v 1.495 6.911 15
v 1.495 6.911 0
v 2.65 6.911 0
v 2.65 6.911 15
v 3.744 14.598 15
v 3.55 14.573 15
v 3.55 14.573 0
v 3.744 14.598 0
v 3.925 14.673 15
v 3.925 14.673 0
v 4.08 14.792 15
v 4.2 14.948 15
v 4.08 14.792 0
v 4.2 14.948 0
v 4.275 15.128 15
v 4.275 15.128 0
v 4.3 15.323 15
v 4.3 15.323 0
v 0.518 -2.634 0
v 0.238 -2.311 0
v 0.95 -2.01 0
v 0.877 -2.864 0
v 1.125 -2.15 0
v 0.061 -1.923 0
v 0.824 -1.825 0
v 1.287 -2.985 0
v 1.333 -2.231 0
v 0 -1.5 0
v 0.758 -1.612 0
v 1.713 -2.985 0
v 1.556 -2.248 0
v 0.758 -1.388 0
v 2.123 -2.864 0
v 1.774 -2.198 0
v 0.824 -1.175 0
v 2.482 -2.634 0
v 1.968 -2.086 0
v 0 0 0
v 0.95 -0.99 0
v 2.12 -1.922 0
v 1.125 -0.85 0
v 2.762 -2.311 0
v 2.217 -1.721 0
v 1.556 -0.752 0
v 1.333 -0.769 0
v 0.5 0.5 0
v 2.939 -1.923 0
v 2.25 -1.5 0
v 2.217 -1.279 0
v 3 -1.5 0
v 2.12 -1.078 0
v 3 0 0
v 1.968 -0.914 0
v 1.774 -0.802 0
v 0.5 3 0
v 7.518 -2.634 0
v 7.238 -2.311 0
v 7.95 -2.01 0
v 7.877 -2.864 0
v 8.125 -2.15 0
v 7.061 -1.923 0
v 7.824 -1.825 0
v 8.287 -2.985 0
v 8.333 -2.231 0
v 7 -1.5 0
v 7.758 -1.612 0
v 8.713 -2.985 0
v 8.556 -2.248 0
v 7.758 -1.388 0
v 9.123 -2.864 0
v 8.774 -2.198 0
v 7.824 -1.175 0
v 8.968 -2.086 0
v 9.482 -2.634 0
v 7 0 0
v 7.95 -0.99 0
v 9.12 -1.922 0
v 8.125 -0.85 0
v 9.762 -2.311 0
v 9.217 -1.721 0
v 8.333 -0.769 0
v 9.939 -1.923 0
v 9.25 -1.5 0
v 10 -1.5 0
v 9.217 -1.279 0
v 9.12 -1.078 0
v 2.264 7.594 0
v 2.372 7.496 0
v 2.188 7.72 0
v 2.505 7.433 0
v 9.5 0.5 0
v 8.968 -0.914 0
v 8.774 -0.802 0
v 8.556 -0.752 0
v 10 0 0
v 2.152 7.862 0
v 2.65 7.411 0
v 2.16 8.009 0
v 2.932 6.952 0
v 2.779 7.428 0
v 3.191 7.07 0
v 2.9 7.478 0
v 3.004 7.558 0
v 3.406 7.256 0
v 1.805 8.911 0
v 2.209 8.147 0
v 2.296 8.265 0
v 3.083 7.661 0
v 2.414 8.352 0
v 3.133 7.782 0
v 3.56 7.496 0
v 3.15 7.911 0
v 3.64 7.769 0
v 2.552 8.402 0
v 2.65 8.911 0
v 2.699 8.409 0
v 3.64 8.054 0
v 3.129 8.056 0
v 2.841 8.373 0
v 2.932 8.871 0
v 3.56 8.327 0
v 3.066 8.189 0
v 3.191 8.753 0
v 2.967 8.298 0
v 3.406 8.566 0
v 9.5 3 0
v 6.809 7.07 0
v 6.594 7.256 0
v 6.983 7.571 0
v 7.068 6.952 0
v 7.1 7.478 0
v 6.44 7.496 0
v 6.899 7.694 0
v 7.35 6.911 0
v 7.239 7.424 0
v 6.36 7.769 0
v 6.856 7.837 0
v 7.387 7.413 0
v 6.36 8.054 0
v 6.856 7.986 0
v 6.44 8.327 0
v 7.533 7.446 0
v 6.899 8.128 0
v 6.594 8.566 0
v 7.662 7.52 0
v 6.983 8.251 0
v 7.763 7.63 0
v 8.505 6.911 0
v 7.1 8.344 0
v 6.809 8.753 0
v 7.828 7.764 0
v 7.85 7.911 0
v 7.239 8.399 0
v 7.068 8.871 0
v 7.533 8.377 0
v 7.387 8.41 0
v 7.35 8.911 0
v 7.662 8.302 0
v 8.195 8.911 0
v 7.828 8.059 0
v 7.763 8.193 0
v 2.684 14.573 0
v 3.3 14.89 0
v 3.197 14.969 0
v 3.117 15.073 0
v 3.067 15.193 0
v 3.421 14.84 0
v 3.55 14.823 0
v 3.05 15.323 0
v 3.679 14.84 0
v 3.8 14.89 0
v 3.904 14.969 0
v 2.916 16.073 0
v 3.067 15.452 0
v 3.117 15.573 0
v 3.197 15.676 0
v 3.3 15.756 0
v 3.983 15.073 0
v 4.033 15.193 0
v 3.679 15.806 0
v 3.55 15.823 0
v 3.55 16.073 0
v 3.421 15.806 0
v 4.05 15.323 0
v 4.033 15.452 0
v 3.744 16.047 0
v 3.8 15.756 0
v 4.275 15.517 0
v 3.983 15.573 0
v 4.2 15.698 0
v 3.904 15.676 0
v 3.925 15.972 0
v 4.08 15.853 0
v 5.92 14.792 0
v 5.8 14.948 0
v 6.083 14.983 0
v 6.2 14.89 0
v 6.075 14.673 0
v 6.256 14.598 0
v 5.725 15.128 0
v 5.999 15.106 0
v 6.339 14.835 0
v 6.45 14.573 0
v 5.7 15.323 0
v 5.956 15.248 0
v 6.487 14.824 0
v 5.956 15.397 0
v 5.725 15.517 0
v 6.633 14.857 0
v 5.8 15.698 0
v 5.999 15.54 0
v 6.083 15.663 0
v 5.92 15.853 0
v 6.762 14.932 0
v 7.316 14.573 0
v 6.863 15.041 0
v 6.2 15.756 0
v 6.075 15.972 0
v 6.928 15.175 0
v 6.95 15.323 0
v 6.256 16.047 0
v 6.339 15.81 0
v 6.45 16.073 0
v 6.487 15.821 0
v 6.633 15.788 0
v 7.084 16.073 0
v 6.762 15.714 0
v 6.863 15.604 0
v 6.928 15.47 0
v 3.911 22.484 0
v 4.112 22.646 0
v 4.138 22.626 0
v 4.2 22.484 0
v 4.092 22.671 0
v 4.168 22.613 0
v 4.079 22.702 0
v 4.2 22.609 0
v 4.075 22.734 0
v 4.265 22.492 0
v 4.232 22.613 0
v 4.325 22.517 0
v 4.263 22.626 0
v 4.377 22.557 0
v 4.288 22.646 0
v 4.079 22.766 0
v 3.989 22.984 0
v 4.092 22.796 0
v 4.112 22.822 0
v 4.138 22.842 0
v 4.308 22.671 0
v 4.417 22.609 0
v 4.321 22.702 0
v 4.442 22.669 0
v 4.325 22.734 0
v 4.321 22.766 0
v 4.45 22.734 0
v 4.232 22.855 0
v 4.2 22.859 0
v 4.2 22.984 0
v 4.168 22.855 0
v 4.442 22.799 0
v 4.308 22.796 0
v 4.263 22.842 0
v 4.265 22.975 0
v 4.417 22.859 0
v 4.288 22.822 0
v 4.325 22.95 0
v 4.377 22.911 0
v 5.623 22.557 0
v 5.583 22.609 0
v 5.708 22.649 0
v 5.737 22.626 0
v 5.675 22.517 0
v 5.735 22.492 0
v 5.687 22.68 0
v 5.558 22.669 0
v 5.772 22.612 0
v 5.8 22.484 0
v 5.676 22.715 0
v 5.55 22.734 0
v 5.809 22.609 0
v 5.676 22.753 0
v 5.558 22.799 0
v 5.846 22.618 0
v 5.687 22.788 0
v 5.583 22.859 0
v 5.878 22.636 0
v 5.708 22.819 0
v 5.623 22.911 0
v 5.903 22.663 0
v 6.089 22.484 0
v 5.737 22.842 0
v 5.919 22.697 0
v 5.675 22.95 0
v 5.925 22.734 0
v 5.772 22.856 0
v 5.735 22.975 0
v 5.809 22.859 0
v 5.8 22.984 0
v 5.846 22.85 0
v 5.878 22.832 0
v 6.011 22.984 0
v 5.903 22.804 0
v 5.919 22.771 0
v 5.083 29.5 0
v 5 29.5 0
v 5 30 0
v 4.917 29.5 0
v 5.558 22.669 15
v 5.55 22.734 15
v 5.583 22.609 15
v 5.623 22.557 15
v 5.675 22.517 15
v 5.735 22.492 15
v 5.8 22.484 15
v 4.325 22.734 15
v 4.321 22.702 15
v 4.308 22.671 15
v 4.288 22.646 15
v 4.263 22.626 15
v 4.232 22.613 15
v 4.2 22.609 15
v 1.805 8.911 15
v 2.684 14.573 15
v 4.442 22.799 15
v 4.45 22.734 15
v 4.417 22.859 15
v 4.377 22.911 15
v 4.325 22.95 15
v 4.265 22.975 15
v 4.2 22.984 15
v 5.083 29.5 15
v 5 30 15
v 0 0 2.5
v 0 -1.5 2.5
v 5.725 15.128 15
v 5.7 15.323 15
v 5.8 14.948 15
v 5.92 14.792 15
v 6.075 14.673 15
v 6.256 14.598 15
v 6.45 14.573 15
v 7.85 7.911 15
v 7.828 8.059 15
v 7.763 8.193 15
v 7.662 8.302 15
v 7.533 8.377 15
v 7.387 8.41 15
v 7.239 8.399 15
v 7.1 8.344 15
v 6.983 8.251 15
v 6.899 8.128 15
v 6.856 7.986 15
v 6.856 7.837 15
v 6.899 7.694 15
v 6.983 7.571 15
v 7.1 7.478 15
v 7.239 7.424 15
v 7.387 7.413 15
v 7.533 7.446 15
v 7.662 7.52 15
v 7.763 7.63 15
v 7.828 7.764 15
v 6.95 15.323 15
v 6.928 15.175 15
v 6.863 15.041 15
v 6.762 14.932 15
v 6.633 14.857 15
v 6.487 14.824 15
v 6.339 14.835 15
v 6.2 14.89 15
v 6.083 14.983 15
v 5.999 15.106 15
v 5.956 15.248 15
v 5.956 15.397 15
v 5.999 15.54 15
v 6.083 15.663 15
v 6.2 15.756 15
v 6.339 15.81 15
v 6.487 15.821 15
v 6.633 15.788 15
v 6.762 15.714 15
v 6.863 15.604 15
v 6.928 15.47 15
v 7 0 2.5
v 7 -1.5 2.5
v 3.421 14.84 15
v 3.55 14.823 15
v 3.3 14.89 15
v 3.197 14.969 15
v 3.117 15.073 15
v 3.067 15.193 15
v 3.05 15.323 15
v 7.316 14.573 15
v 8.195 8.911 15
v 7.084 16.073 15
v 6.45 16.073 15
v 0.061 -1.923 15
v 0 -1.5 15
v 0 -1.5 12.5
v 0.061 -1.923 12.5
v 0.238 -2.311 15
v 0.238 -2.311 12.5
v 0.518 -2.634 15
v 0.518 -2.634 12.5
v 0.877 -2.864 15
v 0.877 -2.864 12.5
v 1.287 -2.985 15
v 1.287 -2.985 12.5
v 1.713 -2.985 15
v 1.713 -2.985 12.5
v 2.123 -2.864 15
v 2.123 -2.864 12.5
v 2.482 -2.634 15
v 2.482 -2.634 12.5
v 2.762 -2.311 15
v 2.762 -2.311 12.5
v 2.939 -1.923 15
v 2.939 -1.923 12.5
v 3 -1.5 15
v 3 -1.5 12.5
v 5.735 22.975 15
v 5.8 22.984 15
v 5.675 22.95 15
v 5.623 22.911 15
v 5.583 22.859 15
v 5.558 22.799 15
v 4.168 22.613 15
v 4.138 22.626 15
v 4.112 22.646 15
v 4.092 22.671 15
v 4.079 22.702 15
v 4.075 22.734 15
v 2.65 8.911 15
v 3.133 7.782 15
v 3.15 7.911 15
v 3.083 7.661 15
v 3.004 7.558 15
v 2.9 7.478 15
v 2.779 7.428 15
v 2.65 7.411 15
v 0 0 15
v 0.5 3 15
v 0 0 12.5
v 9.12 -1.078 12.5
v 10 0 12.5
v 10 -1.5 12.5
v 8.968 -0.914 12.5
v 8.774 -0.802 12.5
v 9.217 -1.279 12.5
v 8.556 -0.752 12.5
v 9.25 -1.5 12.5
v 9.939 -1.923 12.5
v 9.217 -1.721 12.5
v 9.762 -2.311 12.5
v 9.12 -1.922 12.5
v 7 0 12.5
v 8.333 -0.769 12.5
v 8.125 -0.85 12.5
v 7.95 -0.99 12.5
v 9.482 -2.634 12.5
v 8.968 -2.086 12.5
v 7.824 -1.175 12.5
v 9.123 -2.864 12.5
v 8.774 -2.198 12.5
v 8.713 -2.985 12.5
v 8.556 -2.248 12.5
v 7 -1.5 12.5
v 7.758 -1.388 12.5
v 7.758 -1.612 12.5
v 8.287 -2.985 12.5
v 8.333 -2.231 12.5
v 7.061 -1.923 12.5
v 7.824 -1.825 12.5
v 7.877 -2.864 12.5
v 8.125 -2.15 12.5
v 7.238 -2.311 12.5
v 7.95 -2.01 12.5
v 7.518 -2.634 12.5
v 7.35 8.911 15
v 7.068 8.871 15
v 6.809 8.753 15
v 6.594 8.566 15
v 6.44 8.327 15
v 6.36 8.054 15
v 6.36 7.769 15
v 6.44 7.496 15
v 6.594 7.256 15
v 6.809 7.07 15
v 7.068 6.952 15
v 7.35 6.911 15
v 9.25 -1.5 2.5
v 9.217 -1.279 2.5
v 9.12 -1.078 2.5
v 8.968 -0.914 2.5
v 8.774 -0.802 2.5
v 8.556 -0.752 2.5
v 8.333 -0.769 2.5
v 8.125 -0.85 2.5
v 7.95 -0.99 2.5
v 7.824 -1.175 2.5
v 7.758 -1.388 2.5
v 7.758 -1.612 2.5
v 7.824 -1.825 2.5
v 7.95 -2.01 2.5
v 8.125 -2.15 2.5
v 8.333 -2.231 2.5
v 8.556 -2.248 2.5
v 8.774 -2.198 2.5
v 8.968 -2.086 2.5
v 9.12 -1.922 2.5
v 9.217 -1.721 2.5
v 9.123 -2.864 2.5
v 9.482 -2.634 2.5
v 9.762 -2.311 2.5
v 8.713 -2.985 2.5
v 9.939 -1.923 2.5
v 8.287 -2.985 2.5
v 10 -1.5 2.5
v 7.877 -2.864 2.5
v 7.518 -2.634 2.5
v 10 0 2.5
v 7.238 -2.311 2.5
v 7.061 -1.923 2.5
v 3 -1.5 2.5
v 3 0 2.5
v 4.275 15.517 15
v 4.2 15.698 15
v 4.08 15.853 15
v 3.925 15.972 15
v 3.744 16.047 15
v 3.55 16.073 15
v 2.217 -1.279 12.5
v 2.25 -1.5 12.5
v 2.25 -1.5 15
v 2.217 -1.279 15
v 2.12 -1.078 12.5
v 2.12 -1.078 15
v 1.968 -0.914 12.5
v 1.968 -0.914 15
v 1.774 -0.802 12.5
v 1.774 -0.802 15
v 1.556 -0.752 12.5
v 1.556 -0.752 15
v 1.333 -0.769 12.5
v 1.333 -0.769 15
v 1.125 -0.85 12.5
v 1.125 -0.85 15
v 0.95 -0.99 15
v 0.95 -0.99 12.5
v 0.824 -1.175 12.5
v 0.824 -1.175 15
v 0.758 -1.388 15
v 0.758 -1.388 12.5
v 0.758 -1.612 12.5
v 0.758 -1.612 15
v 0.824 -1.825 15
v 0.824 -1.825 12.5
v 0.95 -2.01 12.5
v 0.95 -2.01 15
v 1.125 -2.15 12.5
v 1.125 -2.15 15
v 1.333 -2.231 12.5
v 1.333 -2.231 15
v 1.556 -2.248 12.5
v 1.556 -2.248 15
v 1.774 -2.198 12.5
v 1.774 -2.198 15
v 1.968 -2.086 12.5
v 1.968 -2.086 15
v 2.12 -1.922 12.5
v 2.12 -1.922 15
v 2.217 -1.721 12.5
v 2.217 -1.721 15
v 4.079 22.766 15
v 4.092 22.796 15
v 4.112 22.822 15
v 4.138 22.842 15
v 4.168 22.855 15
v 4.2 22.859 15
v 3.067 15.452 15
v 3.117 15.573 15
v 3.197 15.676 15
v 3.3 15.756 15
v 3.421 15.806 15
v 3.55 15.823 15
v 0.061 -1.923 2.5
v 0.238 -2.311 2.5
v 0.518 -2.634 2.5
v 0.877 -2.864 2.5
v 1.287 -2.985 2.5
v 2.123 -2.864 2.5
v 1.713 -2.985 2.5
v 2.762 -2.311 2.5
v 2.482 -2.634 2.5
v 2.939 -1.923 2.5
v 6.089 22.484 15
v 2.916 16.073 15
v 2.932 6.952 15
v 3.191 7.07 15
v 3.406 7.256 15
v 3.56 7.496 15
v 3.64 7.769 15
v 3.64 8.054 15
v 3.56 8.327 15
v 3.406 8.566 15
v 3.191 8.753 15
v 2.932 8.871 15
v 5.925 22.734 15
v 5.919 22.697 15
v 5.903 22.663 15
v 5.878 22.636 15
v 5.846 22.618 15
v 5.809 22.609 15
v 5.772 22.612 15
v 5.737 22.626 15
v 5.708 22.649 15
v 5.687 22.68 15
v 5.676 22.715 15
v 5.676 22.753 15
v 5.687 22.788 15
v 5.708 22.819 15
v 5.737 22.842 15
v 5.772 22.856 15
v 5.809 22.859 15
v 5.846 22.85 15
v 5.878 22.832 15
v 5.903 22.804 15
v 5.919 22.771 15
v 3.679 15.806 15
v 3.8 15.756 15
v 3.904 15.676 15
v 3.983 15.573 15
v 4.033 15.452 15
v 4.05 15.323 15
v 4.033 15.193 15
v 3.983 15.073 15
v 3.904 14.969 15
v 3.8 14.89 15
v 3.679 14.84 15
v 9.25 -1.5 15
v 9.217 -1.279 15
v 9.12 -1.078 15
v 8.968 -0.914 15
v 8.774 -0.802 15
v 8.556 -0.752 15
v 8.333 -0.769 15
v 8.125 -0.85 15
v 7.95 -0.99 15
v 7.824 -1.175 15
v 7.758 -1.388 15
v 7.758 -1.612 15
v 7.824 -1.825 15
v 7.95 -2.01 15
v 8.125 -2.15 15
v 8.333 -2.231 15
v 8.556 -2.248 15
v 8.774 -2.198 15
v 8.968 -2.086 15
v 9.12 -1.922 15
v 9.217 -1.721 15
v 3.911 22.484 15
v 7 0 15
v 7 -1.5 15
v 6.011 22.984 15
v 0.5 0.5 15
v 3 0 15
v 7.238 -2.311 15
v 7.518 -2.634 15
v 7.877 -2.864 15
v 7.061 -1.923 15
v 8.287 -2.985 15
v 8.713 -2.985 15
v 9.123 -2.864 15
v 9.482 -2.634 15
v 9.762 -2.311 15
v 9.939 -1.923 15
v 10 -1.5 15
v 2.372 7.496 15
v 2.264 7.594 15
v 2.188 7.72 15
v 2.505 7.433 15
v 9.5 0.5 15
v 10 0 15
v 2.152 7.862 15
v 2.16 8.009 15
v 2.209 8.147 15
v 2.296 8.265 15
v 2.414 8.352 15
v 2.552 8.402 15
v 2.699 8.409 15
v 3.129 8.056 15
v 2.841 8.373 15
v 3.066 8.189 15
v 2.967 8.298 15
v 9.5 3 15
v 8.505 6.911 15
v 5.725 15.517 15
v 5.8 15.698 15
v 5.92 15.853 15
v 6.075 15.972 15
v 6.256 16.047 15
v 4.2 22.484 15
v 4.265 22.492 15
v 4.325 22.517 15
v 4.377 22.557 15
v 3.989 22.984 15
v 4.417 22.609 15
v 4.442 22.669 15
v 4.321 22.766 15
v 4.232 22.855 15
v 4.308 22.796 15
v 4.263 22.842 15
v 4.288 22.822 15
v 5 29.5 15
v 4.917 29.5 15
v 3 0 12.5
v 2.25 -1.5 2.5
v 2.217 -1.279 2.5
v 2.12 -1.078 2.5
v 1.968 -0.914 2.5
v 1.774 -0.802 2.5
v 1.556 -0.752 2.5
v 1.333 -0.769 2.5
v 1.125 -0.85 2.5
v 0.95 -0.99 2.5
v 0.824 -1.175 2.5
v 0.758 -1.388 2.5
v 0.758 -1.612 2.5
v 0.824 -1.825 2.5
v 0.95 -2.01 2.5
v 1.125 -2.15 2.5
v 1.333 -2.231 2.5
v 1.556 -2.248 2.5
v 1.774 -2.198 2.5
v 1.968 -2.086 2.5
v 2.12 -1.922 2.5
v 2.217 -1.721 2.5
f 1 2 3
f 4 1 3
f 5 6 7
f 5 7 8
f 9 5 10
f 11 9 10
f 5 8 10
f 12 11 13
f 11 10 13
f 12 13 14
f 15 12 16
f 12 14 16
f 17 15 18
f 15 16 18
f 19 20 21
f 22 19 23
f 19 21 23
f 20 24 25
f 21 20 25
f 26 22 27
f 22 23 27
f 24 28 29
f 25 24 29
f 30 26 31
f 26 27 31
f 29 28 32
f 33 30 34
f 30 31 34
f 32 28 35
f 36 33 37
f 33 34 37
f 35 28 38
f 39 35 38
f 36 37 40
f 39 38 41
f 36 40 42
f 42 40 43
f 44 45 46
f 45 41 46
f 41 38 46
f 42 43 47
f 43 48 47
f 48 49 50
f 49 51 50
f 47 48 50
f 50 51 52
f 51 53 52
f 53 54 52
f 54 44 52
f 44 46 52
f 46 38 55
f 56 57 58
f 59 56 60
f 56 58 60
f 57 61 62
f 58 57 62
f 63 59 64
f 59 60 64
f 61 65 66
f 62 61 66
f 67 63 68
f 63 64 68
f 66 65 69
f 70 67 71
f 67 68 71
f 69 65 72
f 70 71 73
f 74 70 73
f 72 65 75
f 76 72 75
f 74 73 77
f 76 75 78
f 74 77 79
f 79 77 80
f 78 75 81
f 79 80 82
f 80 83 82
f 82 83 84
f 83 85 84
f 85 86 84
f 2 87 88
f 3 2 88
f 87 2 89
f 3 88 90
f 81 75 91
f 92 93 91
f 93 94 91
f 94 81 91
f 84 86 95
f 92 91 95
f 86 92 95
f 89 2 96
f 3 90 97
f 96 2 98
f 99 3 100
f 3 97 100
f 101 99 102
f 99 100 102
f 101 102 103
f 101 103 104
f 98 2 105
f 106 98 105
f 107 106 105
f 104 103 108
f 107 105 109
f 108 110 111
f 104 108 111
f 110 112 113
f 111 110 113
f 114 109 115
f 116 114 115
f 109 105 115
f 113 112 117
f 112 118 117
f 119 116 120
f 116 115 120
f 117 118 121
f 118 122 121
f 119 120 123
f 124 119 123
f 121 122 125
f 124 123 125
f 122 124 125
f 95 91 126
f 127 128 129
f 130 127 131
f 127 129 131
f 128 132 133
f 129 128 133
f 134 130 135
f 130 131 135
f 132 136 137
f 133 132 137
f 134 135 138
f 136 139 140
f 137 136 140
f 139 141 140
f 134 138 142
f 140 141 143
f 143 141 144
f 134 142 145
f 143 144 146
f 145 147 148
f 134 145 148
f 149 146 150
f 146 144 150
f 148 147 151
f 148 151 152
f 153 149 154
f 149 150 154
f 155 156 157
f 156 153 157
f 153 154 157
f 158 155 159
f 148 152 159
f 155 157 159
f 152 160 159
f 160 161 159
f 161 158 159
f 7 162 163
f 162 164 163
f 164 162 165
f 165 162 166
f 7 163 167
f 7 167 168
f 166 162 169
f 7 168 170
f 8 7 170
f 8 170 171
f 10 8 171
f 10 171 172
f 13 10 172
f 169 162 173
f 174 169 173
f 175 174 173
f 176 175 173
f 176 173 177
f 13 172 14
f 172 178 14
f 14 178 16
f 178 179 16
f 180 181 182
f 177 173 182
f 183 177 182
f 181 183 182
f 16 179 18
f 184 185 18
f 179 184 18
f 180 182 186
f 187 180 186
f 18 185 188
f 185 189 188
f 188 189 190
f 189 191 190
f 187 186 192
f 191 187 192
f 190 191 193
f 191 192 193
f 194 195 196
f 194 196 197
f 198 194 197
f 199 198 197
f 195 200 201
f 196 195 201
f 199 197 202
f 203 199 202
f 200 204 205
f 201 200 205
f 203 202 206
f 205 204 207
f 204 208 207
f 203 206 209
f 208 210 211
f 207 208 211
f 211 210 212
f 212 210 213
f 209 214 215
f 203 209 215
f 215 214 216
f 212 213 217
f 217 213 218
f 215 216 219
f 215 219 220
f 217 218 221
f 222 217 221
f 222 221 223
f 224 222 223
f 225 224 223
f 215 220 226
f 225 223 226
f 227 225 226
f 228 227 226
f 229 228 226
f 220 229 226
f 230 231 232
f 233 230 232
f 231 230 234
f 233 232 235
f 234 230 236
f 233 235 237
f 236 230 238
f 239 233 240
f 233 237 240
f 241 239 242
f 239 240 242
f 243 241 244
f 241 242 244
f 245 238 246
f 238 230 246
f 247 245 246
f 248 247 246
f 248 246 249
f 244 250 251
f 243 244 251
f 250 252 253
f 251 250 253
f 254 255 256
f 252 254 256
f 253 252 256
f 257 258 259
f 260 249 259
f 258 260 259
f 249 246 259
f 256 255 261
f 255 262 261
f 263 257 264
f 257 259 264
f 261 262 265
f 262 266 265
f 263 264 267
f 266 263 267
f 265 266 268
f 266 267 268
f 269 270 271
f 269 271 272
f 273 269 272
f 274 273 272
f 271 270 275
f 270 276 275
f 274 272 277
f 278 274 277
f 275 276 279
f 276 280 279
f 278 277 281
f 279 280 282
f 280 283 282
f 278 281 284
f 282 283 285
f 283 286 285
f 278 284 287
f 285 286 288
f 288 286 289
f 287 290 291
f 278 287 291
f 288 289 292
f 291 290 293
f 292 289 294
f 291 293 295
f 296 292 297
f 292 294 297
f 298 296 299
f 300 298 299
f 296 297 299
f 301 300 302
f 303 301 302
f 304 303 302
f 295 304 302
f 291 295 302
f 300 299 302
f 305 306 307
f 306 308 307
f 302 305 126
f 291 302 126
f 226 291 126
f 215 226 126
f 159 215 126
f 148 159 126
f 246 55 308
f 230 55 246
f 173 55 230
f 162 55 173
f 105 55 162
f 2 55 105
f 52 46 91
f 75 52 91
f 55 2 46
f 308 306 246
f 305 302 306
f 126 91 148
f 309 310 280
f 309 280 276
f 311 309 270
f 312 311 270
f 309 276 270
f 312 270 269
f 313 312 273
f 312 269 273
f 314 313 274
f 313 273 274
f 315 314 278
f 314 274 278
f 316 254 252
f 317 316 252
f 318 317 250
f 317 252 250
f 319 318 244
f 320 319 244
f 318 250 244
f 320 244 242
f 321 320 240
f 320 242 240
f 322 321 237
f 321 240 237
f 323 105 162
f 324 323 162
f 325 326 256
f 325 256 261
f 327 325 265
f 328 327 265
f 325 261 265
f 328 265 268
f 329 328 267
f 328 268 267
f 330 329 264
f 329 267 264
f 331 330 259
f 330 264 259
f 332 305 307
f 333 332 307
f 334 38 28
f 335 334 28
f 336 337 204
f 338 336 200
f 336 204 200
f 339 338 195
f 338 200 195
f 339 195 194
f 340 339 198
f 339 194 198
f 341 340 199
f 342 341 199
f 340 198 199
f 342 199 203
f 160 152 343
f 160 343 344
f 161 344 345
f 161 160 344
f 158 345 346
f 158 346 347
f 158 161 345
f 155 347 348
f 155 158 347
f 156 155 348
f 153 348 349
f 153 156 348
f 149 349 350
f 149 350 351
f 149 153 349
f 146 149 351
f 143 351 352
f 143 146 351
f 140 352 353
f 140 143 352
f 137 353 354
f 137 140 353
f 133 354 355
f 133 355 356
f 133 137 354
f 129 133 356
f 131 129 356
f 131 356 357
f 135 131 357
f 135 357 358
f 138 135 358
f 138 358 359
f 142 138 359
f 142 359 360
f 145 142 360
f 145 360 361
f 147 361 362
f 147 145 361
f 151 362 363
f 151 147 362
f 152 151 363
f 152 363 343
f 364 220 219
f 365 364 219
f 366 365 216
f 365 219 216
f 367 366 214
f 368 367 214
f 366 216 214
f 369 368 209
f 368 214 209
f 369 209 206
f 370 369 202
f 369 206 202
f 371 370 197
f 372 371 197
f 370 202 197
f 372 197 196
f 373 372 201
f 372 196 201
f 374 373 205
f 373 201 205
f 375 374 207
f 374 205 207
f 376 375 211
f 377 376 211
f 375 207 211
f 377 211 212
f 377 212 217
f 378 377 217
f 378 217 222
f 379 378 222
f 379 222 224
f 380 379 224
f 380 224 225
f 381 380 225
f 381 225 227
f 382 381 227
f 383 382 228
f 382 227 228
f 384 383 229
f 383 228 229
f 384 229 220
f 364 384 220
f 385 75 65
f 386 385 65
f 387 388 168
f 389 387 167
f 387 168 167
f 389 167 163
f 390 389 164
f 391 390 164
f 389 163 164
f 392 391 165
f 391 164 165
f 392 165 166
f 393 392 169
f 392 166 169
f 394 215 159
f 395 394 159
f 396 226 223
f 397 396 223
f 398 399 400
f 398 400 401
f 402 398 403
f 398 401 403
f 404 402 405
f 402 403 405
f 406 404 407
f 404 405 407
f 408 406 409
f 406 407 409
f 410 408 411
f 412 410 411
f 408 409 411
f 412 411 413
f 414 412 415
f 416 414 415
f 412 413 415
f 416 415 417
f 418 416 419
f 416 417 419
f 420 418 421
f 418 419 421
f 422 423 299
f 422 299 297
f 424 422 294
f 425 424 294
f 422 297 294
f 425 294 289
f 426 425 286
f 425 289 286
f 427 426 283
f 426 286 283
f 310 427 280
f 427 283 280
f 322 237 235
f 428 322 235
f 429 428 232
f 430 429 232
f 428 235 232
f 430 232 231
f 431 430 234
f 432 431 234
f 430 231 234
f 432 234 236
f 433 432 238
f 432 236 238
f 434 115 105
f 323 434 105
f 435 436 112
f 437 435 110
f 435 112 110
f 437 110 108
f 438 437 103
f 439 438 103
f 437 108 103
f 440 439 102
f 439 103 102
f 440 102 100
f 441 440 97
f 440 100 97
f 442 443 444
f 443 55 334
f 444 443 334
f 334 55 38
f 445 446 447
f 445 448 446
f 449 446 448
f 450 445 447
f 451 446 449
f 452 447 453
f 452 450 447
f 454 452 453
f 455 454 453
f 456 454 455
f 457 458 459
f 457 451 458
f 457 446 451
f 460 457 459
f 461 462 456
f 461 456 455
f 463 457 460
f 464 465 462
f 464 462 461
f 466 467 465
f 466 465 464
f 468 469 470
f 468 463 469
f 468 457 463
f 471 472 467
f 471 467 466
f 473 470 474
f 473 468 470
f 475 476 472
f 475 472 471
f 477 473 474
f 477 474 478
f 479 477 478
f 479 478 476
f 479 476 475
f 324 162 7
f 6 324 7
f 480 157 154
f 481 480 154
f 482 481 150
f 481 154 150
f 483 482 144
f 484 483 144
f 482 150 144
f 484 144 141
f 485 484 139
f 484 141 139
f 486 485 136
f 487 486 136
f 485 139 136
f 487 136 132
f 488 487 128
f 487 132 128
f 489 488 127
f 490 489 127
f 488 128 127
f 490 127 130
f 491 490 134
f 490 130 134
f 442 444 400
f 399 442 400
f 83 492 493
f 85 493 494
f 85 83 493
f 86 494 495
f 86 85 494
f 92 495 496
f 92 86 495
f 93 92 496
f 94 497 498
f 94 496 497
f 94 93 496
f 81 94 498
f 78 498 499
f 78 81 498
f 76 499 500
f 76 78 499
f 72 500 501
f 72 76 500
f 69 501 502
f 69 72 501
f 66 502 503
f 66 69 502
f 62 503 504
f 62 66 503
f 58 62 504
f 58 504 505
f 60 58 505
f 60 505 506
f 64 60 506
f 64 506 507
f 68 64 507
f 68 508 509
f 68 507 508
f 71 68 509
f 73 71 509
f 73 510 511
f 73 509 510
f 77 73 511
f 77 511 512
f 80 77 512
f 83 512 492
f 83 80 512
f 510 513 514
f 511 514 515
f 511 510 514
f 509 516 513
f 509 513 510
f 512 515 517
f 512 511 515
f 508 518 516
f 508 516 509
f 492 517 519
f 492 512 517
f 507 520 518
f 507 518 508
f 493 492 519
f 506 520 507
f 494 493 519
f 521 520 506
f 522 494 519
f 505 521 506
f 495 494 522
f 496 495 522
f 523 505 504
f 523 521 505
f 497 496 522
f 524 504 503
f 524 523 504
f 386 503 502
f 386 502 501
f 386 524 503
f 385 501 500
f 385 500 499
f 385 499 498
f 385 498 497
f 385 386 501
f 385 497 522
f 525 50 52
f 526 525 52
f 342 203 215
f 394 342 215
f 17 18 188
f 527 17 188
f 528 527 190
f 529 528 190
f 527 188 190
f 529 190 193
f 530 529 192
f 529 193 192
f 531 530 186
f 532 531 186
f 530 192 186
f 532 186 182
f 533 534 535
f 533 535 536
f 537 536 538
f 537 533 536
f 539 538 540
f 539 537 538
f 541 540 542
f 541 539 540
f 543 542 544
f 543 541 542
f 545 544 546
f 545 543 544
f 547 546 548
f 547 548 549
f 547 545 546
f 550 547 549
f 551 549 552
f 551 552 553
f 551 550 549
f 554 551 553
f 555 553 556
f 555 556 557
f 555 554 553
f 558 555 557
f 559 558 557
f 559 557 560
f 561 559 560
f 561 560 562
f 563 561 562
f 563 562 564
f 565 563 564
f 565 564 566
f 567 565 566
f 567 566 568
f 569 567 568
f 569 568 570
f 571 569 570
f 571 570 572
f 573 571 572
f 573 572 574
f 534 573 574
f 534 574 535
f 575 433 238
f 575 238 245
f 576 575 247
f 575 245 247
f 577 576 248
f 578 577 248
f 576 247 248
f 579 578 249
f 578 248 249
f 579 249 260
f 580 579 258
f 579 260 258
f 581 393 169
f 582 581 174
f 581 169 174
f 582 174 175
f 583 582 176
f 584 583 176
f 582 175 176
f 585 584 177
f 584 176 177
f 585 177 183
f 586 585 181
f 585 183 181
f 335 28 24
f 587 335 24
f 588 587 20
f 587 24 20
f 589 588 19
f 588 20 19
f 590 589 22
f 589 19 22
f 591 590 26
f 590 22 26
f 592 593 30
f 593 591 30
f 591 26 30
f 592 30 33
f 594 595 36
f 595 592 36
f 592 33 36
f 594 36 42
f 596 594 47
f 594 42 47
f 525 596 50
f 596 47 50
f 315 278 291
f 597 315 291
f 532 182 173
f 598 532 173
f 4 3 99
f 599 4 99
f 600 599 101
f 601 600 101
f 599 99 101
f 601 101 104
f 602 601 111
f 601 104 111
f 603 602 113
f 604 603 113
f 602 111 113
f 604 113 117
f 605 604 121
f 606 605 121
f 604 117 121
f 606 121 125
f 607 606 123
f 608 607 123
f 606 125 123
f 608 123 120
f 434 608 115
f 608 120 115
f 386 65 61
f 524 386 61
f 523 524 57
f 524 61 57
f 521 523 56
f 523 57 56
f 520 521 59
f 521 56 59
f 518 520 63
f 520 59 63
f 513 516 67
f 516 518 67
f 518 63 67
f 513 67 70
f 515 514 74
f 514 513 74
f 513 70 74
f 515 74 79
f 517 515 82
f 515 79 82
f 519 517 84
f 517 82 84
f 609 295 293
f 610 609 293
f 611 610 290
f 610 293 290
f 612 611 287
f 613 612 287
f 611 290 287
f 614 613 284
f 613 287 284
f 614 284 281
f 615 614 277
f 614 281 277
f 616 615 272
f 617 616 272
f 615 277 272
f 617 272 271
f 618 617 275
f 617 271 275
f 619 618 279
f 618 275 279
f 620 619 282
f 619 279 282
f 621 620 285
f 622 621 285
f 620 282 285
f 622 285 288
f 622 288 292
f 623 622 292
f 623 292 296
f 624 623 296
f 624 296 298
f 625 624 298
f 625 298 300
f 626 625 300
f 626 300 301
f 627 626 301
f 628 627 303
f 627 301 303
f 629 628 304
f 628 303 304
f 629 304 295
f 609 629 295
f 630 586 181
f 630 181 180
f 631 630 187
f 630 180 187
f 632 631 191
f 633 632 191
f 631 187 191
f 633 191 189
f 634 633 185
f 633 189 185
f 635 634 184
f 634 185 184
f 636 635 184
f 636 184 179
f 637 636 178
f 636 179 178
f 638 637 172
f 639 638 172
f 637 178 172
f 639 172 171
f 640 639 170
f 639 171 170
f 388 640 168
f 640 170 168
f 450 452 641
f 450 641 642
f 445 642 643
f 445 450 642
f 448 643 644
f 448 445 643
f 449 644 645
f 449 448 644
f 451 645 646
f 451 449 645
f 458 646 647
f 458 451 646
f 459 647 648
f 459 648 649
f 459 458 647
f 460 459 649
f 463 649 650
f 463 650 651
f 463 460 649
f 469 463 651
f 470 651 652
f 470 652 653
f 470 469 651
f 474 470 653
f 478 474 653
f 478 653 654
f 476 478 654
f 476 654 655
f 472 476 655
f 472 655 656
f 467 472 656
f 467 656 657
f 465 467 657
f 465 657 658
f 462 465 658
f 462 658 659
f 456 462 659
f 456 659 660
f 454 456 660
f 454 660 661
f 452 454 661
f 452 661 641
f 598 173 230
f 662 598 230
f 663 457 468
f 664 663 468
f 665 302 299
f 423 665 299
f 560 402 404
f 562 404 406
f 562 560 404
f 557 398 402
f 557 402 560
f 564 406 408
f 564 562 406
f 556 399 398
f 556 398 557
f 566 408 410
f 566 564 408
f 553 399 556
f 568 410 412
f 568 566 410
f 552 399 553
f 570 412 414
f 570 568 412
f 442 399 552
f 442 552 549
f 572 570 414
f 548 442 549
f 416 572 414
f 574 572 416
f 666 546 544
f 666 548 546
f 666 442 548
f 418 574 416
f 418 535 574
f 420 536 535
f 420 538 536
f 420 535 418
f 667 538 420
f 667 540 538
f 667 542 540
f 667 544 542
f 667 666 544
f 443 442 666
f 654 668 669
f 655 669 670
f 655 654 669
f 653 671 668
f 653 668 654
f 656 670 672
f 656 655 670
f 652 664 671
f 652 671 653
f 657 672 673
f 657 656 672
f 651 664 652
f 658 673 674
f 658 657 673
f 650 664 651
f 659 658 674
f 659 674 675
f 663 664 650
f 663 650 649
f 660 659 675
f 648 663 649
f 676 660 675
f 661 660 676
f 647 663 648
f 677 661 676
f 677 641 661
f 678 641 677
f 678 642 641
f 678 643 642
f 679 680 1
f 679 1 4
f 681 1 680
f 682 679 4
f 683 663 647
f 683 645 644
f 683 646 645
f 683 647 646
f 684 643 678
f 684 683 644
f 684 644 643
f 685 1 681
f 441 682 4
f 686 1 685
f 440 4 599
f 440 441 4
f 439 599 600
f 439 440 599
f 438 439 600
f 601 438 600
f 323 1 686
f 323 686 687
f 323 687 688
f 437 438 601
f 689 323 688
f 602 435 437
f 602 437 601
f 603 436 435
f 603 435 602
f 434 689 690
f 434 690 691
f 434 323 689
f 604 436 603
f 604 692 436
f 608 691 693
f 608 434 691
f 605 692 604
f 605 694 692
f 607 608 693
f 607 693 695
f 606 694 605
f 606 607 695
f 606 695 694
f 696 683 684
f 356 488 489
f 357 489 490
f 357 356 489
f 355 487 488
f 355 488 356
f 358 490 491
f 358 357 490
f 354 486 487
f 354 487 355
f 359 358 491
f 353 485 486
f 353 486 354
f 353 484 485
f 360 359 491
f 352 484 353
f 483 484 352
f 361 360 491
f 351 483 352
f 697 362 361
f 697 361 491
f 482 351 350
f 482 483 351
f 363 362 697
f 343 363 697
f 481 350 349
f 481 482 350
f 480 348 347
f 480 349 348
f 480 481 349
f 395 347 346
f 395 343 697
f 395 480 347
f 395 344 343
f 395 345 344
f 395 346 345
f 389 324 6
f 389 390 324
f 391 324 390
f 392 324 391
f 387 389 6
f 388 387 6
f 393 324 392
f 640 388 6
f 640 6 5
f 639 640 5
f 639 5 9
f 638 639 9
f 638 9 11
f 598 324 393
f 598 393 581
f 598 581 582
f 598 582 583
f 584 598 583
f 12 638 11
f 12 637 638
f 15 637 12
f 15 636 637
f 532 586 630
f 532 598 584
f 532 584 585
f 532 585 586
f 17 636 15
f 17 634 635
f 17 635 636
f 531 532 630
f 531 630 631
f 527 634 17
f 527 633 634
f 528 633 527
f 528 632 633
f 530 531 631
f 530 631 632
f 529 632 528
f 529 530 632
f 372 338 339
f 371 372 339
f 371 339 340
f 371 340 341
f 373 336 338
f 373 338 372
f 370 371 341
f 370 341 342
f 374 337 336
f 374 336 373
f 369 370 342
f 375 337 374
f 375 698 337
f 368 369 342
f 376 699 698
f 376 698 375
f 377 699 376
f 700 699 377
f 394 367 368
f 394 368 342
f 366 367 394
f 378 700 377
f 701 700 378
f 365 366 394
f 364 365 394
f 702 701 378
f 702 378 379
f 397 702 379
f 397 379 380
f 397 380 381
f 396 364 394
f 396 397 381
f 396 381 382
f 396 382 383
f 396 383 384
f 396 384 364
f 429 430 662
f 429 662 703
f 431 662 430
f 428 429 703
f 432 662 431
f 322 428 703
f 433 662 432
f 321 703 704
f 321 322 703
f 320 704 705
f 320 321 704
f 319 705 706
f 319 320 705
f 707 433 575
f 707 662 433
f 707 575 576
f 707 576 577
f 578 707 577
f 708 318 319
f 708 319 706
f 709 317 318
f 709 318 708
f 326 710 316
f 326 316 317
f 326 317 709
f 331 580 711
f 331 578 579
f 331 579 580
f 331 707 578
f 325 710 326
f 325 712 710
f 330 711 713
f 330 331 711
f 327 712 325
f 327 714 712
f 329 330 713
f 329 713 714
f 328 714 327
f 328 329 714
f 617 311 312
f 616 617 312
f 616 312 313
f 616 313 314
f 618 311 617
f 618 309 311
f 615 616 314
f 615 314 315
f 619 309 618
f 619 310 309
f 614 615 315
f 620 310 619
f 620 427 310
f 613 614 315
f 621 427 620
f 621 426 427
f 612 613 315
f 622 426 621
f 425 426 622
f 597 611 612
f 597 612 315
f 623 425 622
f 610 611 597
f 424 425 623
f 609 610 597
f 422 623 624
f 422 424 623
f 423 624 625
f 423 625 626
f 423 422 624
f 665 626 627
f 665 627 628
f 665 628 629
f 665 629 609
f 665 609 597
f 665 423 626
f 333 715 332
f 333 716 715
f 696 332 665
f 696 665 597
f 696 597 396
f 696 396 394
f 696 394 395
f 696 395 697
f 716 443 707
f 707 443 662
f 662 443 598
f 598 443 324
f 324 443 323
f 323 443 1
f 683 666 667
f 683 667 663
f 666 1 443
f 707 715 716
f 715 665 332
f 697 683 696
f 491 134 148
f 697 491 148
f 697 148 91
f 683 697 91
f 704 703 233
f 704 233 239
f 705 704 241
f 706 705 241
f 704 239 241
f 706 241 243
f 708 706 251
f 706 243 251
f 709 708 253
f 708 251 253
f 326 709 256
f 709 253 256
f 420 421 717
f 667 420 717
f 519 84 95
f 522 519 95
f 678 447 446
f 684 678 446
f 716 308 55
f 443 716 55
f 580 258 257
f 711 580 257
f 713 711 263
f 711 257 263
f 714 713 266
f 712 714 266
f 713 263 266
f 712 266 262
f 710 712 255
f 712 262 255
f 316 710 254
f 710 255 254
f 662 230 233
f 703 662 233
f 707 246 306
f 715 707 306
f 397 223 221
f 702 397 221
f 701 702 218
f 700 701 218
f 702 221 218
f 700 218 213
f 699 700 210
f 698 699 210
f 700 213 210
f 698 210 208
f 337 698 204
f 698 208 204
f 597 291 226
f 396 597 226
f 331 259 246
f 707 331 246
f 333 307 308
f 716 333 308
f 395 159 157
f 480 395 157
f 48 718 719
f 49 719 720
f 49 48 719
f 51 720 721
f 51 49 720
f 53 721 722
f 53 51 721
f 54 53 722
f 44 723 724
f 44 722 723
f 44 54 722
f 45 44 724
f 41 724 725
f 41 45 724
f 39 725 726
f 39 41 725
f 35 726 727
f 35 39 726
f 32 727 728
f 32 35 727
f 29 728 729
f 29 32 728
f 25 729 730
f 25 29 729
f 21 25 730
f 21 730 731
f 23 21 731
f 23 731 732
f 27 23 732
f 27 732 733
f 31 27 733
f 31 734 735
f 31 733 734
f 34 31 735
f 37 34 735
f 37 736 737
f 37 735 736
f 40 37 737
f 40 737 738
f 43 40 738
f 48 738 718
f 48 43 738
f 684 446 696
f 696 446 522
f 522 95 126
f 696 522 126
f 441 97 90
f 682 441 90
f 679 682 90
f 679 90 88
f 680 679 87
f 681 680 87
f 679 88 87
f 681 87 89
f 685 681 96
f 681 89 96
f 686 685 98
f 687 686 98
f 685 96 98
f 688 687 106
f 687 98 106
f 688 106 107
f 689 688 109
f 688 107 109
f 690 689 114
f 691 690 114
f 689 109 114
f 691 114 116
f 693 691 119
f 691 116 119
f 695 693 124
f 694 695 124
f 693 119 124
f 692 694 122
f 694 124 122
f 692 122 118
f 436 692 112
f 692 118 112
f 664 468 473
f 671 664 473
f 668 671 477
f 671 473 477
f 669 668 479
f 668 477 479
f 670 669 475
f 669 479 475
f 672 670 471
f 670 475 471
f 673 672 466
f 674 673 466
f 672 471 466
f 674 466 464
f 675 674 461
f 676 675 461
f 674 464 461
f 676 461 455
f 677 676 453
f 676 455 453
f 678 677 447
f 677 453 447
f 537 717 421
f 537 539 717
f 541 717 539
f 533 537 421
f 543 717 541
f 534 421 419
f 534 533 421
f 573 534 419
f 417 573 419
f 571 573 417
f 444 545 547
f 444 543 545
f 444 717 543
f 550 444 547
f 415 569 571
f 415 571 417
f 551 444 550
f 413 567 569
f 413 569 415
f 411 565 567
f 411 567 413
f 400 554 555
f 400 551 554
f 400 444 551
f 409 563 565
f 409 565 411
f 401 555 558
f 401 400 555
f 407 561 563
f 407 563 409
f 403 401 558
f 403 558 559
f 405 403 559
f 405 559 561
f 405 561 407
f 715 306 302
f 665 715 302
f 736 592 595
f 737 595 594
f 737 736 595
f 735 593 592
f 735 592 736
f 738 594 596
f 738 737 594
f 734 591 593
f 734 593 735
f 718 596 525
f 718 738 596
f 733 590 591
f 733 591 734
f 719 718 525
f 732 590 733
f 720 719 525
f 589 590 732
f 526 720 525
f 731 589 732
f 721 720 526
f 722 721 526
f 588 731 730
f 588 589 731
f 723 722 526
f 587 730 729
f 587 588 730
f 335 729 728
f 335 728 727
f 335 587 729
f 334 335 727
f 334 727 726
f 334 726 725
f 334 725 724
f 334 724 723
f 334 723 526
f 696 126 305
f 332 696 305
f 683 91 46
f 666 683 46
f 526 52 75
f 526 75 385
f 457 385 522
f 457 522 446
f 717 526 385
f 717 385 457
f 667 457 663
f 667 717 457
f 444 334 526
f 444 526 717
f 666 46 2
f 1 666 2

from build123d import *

# Parameters (mm, degrees)
F0_R     = 0.75
F0_R_2   = 0.5
F2_DEPTH = 15
F3_DEPTH = 10


with BuildPart() as f2:
    # F0 (on Top) → F2 (new body)
    with BuildSketch(Plane.XY):
        Polygon((0.5, 3), (0, 0), (0.5, 0), (0.5, 0.5), align=None)
        with BuildLine():
            Line((0.5, 0), (0, 0))
            Line((0, 0), (0, -1.5))
            ThreePointArc((0, -1.5), (1.5, -3), (3, -1.5))
            Line((3, -1.5), (3, 0))
            Line((3, 0), (1.5, 0))
            Line((1.5, 0), (1.4034414795, 0))
            Line((1.4034414795, 0), (0.5, 0))
        make_face()
        with Locations((1.5, -1.5)):
            Circle(F0_R, mode=Mode.SUBTRACT)
        Polygon((0.5, 0.5), (0.5, 0), (1.4034414795, 0), (1.5, 0), (3, 0), (7, 0), (8.5, 0), (9.5, 0), (9.5, 0.5), align=None)
        Polygon((4.9166666667, 29.5), (0.5, 3), (0.5, 0.5), (1.4948575599, 6.9113042752), (1.6500299737, 7.9113042752), (1.8052023875, 8.9113042752), (2.6836806371, 14.5726085504), (2.8000599475, 15.3226085504), (2.9164392578, 16.0726085504), (3.9112968178, 22.4839128256), (3.9500899212, 22.7339128256), (3.9888830247, 22.9839128256), (5, 29.5), align=None)
        Polygon((5, 30), (4.9166666667, 29.5), (5, 29.5), (5.0833333333, 29.5), align=None)
        Polygon((9.5, 3), (9.5, 0.5), (9.5, 0), (10, 0), align=None)
        Polygon((8.5051424401, 6.9113042752), (9.5, 0.5), (9.5, 3), (5.0833333333, 29.5), (5, 29.5), (6.0111169753, 22.9839128256), (6.0499100788, 22.7339128256), (6.0887031822, 22.4839128256), (7.0835607422, 16.0726085504), (7.1999400525, 15.3226085504), (7.3163193629, 14.5726085504), (8.1947976125, 8.9113042752), align=None)
        with BuildLine():
            Line((10, 0), (9.5, 0))
            Line((9.5, 0), (8.5, 0))
            Line((8.5, 0), (7, 0))
            Line((7, 0), (7, -1.5))
            ThreePointArc((7, -1.5), (8.5, -3), (10, -1.5))
            Line((10, -1.5), (10, 0))
        make_face()
        with Locations((8.5, -1.5)):
            Circle(F0_R, mode=Mode.SUBTRACT)
        with BuildLine():
            Line((1.6500299737, 7.9113042752), (1.4948575599, 6.9113042752))
            Line((1.4948575599, 6.9113042752), (2.6500299737, 6.9113042752))
            ThreePointArc((2.6500299737, 6.9113042752), (3.6500299737, 7.9113042752), (2.6500299737, 8.9113042752))
            Line((2.6500299737, 8.9113042752), (1.8052023875, 8.9113042752))
            Line((1.8052023875, 8.9113042752), (1.6500299737, 7.9113042752))
        make_face()
        with BuildLine():
            ThreePointArc((2.6500299737, 7.4113042752), (2.2964765831, 8.2648576658), (3.1500299737, 7.9113042752))
            ThreePointArc((3.1500299737, 7.9113042752), (3.0035833643, 7.5577508846), (2.6500299737, 7.4113042752))
        make_face(mode=Mode.SUBTRACT)
        with BuildLine():
            Line((7.3499700263, 6.9113042752), (8.5051424401, 6.9113042752))
            Line((8.5051424401, 6.9113042752), (8.1947976125, 8.9113042752))
            Line((8.1947976125, 8.9113042752), (7.3499700263, 8.9113042752))
            ThreePointArc((7.3499700263, 8.9113042752), (6.3499700263, 7.9113042752), (7.3499700263, 6.9113042752))
        make_face()
        with Locations((7.3499700263, 7.9113042752)):
            Circle(F0_R_2, mode=Mode.SUBTRACT)
        with BuildLine():
            Line((2.8000599475, 15.3226085504), (2.6836806371, 14.5726085504))
            Line((2.6836806371, 14.5726085504), (3.5500599475, 14.5726085504))
            Line((3.5500599475, 14.5726085504), (3.5500599475, 14.8226085504))
            ThreePointArc((3.5500599475, 14.8226085504), (3.1965065569, 14.9690551598), (3.0500599475, 15.3226085504))
            Line((3.0500599475, 15.3226085504), (2.8000599475, 15.3226085504))
        make_face()
        with BuildLine():
            Line((3.5500599475, 14.8226085504), (3.5500599475, 14.5726085504))
            ThreePointArc((3.5500599475, 14.5726085504), (4.0803900334, 14.7922784645), (4.3000599475, 15.3226085504))
            Line((4.3000599475, 15.3226085504), (4.0500599475, 15.3226085504))
            ThreePointArc((4.0500599475, 15.3226085504), (3.9036133381, 14.9690551598), (3.5500599475, 14.8226085504))
        make_face()
        with BuildLine():
            Line((4.0500599475, 15.3226085504), (4.3000599475, 15.3226085504))
            ThreePointArc((4.3000599475, 15.3226085504), (4.0803900334, 15.8529386363), (3.5500599475, 16.0726085504))
            Line((3.5500599475, 16.0726085504), (3.5500599475, 15.8226085504))
            ThreePointArc((3.5500599475, 15.8226085504), (3.9036133381, 15.676161941), (4.0500599475, 15.3226085504))
        make_face()
        with BuildLine():
            Line((2.9164392578, 16.0726085504), (2.8000599475, 15.3226085504))
            Line((2.8000599475, 15.3226085504), (3.0500599475, 15.3226085504))
            ThreePointArc((3.0500599475, 15.3226085504), (3.1965065569, 15.676161941), (3.5500599475, 15.8226085504))
            Line((3.5500599475, 15.8226085504), (3.5500599475, 16.0726085504))
            Line((3.5500599475, 16.0726085504), (2.9164392578, 16.0726085504))
        make_face()
        with BuildLine():
            Line((6.9499400525, 15.3226085504), (7.1999400525, 15.3226085504))
            Line((7.1999400525, 15.3226085504), (7.0835607422, 16.0726085504))
            Line((7.0835607422, 16.0726085504), (6.4499400525, 16.0726085504))
            ThreePointArc((6.4499400525, 16.0726085504), (5.9196099666, 15.8529386363), (5.6999400525, 15.3226085504))
            Line((5.6999400525, 15.3226085504), (5.9499400525, 15.3226085504))
            ThreePointArc((5.9499400525, 15.3226085504), (6.4499400525, 15.8226085504), (6.9499400525, 15.3226085504))
        make_face()
        with BuildLine():
            Line((6.4499400525, 14.5726085504), (7.3163193629, 14.5726085504))
            Line((7.3163193629, 14.5726085504), (7.1999400525, 15.3226085504))
            Line((7.1999400525, 15.3226085504), (6.9499400525, 15.3226085504))
            ThreePointArc((6.9499400525, 15.3226085504), (6.4499400525, 14.8226085504), (5.9499400525, 15.3226085504))
            Line((5.9499400525, 15.3226085504), (5.6999400525, 15.3226085504))
            ThreePointArc((5.6999400525, 15.3226085504), (5.9196099666, 14.7922784645), (6.4499400525, 14.5726085504))
        make_face()
        with BuildLine():
            Line((4.0750899212, 22.7339128256), (3.9500899212, 22.7339128256))
            Line((3.9500899212, 22.7339128256), (3.9112968178, 22.4839128256))
            Line((3.9112968178, 22.4839128256), (4.2000899212, 22.4839128256))
            Line((4.2000899212, 22.4839128256), (4.2000899212, 22.6089128256))
            ThreePointArc((4.2000899212, 22.6089128256), (4.1117015736, 22.6455244779), (4.0750899212, 22.7339128256))
        make_face()
        with BuildLine():
            ThreePointArc((4.2000899212, 22.4839128256), (4.3768666165, 22.5571361303), (4.4500899212, 22.7339128256))
            Line((4.4500899212, 22.7339128256), (4.3250899212, 22.7339128256))
            ThreePointArc((4.3250899212, 22.7339128256), (4.2884782689, 22.6455244779), (4.2000899212, 22.6089128256))
            Line((4.2000899212, 22.6089128256), (4.2000899212, 22.4839128256))
        make_face()
        with BuildLine():
            ThreePointArc((4.4500899212, 22.7339128256), (4.3768666165, 22.9106895209), (4.2000899212, 22.9839128256))
            Line((4.2000899212, 22.9839128256), (4.2000899212, 22.8589128256))
            ThreePointArc((4.2000899212, 22.8589128256), (4.2884782689, 22.8223011732), (4.3250899212, 22.7339128256))
            Line((4.3250899212, 22.7339128256), (4.4500899212, 22.7339128256))
        make_face()
        with BuildLine():
            Line((4.2000899212, 22.9839128256), (3.9888830247, 22.9839128256))
            Line((3.9888830247, 22.9839128256), (3.9500899212, 22.7339128256))
            Line((3.9500899212, 22.7339128256), (4.0750899212, 22.7339128256))
            ThreePointArc((4.0750899212, 22.7339128256), (4.1117015736, 22.8223011732), (4.2000899212, 22.8589128256))
            Line((4.2000899212, 22.8589128256), (4.2000899212, 22.9839128256))
        make_face()
        with BuildLine():
            Line((6.0499100788, 22.7339128256), (6.0111169753, 22.9839128256))
            Line((6.0111169753, 22.9839128256), (5.7999100788, 22.9839128256))
            ThreePointArc((5.7999100788, 22.9839128256), (5.6231333835, 22.9106895209), (5.5499100788, 22.7339128256))
            Line((5.5499100788, 22.7339128256), (5.6749100788, 22.7339128256))
            ThreePointArc((5.6749100788, 22.7339128256), (5.7999100788, 22.8589128256), (5.9249100788, 22.7339128256))
            Line((5.9249100788, 22.7339128256), (6.0499100788, 22.7339128256))
        make_face()
        with BuildLine():
            Line((6.0887031822, 22.4839128256), (6.0499100788, 22.7339128256))
            Line((6.0499100788, 22.7339128256), (5.9249100788, 22.7339128256))
            ThreePointArc((5.9249100788, 22.7339128256), (5.7999100788, 22.6089128256), (5.6749100788, 22.7339128256))
            Line((5.6749100788, 22.7339128256), (5.5499100788, 22.7339128256))
            ThreePointArc((5.5499100788, 22.7339128256), (5.6231333835, 22.5571361303), (5.7999100788, 22.4839128256))
            Line((5.7999100788, 22.4839128256), (6.0887031822, 22.4839128256))
        make_face()
    extrude(amount=F2_DEPTH)

    # F1 (on Right) → F3 (cut)
    with BuildSketch(Plane.YZ):
        Polygon((-3, 2.5), (0, 2.5), (0, 7.5), (0, 12.5), (-3, 12.5), align=None)
    extrude(amount=F3_DEPTH, mode=Mode.SUBTRACT)


solid = f2.part
